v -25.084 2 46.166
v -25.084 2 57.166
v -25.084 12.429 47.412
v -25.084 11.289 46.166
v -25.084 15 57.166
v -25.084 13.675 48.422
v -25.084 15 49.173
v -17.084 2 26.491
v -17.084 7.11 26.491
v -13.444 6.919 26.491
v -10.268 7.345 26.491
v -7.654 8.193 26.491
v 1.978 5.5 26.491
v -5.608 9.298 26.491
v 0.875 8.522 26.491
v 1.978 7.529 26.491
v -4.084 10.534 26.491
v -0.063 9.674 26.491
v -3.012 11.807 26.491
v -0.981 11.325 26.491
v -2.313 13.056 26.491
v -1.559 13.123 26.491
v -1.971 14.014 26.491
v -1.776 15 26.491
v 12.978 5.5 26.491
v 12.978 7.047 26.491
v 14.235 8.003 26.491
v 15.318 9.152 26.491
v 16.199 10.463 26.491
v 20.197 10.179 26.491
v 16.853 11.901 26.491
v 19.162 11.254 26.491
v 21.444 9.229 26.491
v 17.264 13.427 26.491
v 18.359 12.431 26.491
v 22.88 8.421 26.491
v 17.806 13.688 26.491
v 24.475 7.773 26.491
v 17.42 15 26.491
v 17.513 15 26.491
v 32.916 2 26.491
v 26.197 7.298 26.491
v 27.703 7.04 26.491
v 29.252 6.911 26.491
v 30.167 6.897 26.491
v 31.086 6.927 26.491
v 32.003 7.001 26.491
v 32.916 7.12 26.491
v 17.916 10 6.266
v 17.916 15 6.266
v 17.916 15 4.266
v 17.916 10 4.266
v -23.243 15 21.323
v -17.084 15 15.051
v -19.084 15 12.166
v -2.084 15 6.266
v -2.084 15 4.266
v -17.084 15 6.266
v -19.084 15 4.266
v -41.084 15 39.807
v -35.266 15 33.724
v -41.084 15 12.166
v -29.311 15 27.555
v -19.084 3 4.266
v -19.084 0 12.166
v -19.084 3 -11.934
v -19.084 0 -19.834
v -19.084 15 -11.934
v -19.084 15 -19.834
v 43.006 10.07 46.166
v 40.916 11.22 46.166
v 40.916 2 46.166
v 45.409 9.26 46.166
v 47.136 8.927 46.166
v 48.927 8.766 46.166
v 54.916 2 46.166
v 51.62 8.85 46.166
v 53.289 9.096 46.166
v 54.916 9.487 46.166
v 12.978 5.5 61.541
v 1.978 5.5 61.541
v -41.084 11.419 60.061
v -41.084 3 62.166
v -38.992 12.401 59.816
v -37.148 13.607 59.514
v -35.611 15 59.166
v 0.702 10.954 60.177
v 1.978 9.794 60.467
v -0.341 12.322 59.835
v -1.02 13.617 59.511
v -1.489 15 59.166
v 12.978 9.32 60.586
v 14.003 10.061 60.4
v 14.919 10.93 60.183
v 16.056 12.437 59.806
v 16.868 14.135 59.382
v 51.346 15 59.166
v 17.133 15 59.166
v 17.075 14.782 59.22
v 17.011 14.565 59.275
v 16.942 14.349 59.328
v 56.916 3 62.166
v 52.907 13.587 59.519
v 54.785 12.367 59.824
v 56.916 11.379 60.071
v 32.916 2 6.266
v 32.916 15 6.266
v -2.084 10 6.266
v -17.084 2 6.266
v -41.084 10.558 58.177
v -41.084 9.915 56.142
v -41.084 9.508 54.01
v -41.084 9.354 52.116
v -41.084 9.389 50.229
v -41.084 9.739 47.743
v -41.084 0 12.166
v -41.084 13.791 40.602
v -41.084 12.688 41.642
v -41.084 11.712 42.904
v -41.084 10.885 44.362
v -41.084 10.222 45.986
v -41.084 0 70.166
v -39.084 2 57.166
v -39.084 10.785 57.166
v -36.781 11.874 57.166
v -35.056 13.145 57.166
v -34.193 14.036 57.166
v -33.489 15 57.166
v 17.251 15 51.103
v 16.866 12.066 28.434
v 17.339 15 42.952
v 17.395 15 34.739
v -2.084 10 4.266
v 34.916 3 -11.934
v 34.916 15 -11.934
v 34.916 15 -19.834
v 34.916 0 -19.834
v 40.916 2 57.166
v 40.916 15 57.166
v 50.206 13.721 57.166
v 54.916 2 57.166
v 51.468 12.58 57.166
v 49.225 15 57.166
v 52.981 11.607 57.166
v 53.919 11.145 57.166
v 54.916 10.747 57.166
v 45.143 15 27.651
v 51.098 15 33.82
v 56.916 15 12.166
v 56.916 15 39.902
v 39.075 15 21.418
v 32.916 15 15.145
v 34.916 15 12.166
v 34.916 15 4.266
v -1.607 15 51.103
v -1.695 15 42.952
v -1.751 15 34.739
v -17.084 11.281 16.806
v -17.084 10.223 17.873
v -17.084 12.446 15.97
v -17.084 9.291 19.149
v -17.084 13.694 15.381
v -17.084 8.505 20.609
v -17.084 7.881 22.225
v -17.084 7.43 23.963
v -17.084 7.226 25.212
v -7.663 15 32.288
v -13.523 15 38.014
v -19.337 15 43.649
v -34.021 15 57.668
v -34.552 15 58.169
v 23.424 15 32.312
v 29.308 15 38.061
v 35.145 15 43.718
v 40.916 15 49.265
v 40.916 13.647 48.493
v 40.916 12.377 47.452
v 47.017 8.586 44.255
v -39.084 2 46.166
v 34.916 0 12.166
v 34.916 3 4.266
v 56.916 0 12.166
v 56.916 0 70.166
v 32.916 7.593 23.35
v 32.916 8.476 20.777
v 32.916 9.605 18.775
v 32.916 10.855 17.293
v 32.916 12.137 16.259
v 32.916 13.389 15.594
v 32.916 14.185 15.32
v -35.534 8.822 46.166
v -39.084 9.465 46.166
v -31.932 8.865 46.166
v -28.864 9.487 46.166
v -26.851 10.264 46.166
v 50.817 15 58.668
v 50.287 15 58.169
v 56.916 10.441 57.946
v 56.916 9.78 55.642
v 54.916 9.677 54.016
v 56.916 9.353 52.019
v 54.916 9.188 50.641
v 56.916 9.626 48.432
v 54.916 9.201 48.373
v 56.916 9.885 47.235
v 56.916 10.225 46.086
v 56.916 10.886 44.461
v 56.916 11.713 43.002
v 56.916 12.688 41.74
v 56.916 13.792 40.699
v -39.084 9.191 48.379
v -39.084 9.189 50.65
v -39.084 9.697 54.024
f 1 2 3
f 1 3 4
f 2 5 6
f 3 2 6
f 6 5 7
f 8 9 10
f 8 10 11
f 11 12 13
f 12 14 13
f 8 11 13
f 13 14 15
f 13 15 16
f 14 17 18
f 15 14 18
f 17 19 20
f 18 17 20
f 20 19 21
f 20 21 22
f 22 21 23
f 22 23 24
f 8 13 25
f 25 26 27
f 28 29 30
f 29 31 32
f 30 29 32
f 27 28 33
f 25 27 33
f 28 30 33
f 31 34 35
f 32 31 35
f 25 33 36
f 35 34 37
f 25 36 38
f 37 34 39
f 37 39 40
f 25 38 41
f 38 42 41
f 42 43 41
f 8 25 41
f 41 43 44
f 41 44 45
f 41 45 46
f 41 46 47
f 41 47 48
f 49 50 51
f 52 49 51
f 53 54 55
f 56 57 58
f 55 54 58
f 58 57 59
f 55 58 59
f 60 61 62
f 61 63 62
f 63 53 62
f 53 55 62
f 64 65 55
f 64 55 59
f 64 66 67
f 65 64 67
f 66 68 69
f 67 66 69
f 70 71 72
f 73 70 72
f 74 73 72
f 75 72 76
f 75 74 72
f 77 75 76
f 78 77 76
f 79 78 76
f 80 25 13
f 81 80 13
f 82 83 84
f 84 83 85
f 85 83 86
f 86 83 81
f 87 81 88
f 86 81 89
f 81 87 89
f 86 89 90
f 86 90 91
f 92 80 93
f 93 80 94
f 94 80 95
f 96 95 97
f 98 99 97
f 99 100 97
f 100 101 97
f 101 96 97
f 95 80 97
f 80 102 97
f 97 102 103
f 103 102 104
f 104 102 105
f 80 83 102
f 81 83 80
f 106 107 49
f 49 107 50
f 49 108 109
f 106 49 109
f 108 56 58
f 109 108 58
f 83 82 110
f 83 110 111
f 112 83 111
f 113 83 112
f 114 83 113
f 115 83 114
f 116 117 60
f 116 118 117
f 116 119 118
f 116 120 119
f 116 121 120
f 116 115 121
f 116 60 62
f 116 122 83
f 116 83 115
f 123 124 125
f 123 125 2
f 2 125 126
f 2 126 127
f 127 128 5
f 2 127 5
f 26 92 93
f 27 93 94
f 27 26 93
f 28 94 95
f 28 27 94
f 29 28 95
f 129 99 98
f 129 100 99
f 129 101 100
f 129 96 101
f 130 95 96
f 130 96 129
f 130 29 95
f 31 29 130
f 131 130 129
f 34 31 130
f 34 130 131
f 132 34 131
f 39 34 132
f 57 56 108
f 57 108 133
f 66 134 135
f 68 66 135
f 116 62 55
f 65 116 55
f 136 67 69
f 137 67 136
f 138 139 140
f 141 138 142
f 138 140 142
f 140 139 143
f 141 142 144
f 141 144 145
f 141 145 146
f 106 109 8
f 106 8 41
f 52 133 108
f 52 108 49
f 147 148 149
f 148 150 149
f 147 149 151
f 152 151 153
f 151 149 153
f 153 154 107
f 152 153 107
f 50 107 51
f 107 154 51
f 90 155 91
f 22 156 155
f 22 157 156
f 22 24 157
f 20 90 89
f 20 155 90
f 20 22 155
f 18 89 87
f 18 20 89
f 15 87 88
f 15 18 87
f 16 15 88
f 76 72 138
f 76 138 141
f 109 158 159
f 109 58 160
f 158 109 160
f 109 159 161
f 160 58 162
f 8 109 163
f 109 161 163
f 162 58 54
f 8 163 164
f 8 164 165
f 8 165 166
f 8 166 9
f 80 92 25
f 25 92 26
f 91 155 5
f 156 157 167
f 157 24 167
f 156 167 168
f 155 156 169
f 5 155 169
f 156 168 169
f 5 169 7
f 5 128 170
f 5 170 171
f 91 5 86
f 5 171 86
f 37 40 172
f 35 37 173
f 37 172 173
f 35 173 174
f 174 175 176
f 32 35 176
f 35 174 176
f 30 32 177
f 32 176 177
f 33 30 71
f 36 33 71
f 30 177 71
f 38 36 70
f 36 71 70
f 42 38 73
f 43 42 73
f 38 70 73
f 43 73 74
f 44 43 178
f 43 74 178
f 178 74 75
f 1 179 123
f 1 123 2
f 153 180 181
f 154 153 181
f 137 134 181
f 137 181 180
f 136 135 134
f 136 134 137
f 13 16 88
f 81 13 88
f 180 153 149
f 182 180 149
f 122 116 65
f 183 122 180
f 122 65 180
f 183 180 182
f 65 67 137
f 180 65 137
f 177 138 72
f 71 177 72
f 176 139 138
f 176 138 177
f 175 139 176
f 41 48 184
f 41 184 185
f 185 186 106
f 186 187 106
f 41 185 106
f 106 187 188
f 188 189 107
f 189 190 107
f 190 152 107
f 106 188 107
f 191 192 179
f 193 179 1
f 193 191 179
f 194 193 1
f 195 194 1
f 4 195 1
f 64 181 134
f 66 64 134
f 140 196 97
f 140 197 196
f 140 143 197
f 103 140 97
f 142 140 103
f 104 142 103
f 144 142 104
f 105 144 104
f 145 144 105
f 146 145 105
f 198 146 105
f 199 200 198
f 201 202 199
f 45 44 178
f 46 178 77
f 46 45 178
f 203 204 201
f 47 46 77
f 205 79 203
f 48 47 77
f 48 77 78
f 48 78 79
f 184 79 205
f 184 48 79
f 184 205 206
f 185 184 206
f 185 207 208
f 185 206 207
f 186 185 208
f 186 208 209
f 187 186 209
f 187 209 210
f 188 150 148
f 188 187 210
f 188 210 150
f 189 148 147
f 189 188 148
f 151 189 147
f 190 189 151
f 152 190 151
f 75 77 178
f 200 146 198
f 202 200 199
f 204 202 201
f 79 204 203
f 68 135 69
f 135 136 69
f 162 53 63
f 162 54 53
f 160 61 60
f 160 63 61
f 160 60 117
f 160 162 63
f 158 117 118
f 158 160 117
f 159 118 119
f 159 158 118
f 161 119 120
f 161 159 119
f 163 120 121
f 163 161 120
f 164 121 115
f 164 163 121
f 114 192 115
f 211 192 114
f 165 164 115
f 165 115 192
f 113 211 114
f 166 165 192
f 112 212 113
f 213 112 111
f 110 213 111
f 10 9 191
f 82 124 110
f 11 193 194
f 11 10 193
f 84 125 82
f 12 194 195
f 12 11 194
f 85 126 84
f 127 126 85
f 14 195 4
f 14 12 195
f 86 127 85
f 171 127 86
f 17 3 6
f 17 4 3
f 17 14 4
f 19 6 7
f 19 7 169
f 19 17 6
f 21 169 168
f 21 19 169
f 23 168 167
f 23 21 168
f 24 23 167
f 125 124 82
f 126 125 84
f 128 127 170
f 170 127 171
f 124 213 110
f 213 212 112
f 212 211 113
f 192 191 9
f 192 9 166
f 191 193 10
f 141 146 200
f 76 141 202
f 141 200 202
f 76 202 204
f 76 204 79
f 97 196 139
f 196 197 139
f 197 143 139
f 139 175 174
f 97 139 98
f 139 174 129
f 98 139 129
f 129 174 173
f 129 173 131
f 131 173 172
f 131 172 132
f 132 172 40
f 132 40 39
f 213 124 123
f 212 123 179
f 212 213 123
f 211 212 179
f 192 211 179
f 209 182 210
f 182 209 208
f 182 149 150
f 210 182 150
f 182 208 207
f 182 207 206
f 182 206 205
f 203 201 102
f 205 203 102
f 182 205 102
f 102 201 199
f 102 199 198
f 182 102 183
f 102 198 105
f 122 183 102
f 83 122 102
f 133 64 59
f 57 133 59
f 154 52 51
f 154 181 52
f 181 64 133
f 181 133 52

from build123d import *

# Parameters (mm, degrees)
SKETCH1_W                = 98
SKETCH1_H                = 90
BOSS_EXTRUDE1_DEPTH      = 15
CUT_EXTRUDE1_DEPTH       = 15
CUT_EXTRUDE2_DEPTH       = 15
CUT_EXTRUDE5_DEPTH       = 100
CUT_EXTRUDE6_DEPTH       = 100
SKETCH9_R                = 9.5
CUT_EXTRUDE7_DEPTH       = 45
SKETCH10_R               = 9.5
CUT_EXTRUDE8_DEPTH       = 45
BOSS_EXTRUDE3_DEPTH      = 100
BOSS_EXTRUDE4_DEPTH      = 100
SKETCH14_W               = 54.537944566
SKETCH14_H               = 37.433727788
CUT_EXTRUDE9_DEPTH       = 100
SKETCH15_W               = 37.221464136
SKETCH15_H               = 31.979004399
CUT_EXTRUDE10_DEPTH      = 100
BOSS_EXTRUDE5_DEPTH      = 15
BOSS_EXTRUDE6_DEPTH      = 15
BOSS_EXTRUDE7_DEPTH      = 15
CUT_EXTRUDE11_DEPTH      = 100
SKETCH20_R               = 9.5
CUT_EXTRUDE12_DEPTH      = 45
SKETCH21_R               = 9.5
CUT_EXTRUDE13_DEPTH      = 100
SKETCH22_R               = 9.5
BOSS_EXTRUDE8_DEPTH      = 55
SKETCH23_R               = 9.5
CUT_EXTRUDE14_DEPTH      = 55
SKETCH24_R               = 9.5
CUT_EXTRUDE15_DEPTH      = 100
SKETCH25_R               = 9.5
BOSS_EXTRUDE10_DEPTH     = 100
SKETCH26_R               = 9.5
CUT_EXTRUDE16_DEPTH      = 100
CUT_EXTRUDE19_DEPTH      = 100
CUT_EXTRUDE19_DEPTH_BACK = 100
SKETCH27_W               = 176.377882562
SKETCH27_H               = 122.842530298
SKETCH27_W_2             = 98
SKETCH27_H_2             = 90
SKETCH28_W               = 109.510814303
SKETCH28_H               = 24.111992001
CUT_EXTRUDE20_DEPTH      = 100
SKETCH29_R               = 9.59940523
CUT_EXTRUDE21_DEPTH      = 100
SKETCH30_W               = 22
SKETCH30_H               = 32
CUT_EXTRUDE22_DEPTH      = 100
SKETCH31_W               = 16.2
SKETCH31_H               = 12
CUT_EXTRUDE23_DEPTH      = 100
CUT_EXTRUDE24_DEPTH      = 13
SKETCH33_W               = 50.373016546
SKETCH33_H               = 2
BOSS_EXTRUDE12_DEPTH     = 15
SKETCH34_W               = 20
SKETCH34_H               = 2
CUT_EXTRUDE25_DEPTH      = 5
CUT_EXTRUDE27_DEPTH      = 100
SKETCH37_W               = 14
SKETCH37_H               = 11
CUT_EXTRUDE28_DEPTH      = 13
CUT_EXTRUDE32_DEPTH      = 9.5


with BuildPart() as part:
    # Sketch1 → Boss-Extrude1 (new body)
    with BuildSketch(Plane(origin=(0, 0, 0), x_dir=(1, 0, 0), z_dir=(0, 1, 0))):
        with Locations((7.915679061, -25.165675541)):
            Rectangle(SKETCH1_W, SKETCH1_H)
    extrude(amount=BOSS_EXTRUDE1_DEPTH)

    # Sketch3 → Cut-Extrude1 (cut)
    with BuildSketch(Plane(origin=(0, 15, 0), x_dir=(1, 0, 0), z_dir=(0, 1, 0))):
        Polygon((-41.084320939, -35.165675541), (-6.084320939, -70.165675541), (-41.084320939, -70.165675541), align=None)
        Polygon((21.915679061, -70.165675541), (56.915679061, -35.165675541), (56.915679061, -70.165675541), align=None)
    extrude(amount=-CUT_EXTRUDE1_DEPTH, mode=Mode.SUBTRACT)

    # Sketch4 → Cut-Extrude2 (cut)
    with BuildSketch(Plane(origin=(0, 15, 0), x_dir=(1, 0, 0), z_dir=(0, 1, 0))):
        Polygon((-41.084320939, -35.165675541), (-32.241899351, -26.323253953), (-41.084320939, -17.480832365), align=None)
        Polygon((56.915679061, -17.480832365), (48.073257473, -26.323253953), (56.915679061, -35.165675541), align=None)
    extrude(amount=-CUT_EXTRUDE2_DEPTH, mode=Mode.SUBTRACT)

    # Sketch5 → Cut-Extrude5 (cut)
    with BuildSketch(Plane(origin=(-2.959322699, 0, -2.959322699), x_dir=(-0.7071067811865461, 0, 0.7071067811865489), z_dir=(-0.7071067811865489, 0, -0.7071067811865461))):
        Polygon((53.916889577, 0), (52.916889577, 15), (53.916889577, 15), align=None)
    extrude(amount=-CUT_EXTRUDE5_DEPTH, mode=Mode.SUBTRACT)

    # Sketch8 → Cut-Extrude6 (cut)
    with BuildSketch(Plane(origin=(10.87500176, 0, -10.87500176), x_dir=(-0.7071067811865438, 0, -0.7071067811865513), z_dir=(0.7071067811865513, 0, -0.7071067811865438))):
        Polygon((-65.11135026, 0), (-64.11135026, 15), (-65.11135026, 15), align=None)
    extrude(amount=-CUT_EXTRUDE6_DEPTH, mode=Mode.SUBTRACT)

    # Sketch9 → Cut-Extrude7 (cut)
    with BuildSketch(Plane(origin=(45.83695749, 4.321549796, 45.83695749), x_dir=(0.7086694500121591, -0.06622532692378834, -0.7024256663116043), z_dir=(0.7055406512876944, 0.06651901052377404, 0.7055406512877016))):
        with Locations((-0.364665022, 13.674807707)):
            Circle(SKETCH9_R)
    extrude(amount=-CUT_EXTRUDE7_DEPTH, mode=Mode.SUBTRACT)

    # Sketch10 → Cut-Extrude8 (cut)
    with BuildSketch(Plane(origin=(-37.956303558, 3.578554618, 37.956303558), x_dir=(0.708669450012157, 0.06622532692378813, 0.7024256663116066), z_dir=(-0.7055406512876966, 0.06651901052377338, 0.7055406512876994))):
        with Locations((11.452044949, 13.683576238)):
            Circle(SKETCH10_R)
    extrude(amount=-CUT_EXTRUDE8_DEPTH, mode=Mode.SUBTRACT)

    # Sketch12 → Boss-Extrude3 (add)
    with BuildSketch(Plane(origin=(10.87500176, 0, -10.87500176), x_dir=(-0.7071067811865438, 0, -0.7071067811865513), z_dir=(0.7071067811865513, 0, -0.7071067811865438))):
        Polygon((-65.11135026, 0), (-64.11135026, 15), (-65.11135026, 15), align=None)
    extrude(amount=-BOSS_EXTRUDE3_DEPTH)

    # Sketch13 → Boss-Extrude4 (add)
    with BuildSketch(Plane(origin=(-2.959322699, 0, -2.959322699), x_dir=(-0.7071067811865461, 0, 0.7071067811865489), z_dir=(-0.7071067811865489, 0, -0.7071067811865461))):
        Polygon((53.916889577, 0), (52.916889577, 15), (53.916889577, 15), align=None)
    extrude(amount=-BOSS_EXTRUDE4_DEPTH)

    # Sketch14 → Cut-Extrude9 (cut)
    with BuildSketch(Plane(origin=(0, 15, 0), x_dir=(1, 0, 0), z_dir=(0, 1, 0))):
        with Locations((21.184651344, -88.882539435)):
            Rectangle(SKETCH14_W, SKETCH14_H)
    extrude(amount=-CUT_EXTRUDE9_DEPTH, mode=Mode.SUBTRACT)


with BuildPart() as cut_extrude9_piece_1:
    # of the separate pieces the step leaves, piece 1, a body of its own (cut_extrude9_pieces)
    add(part.part.solids().sort_by_distance((-41.084320939, 0, -19.834324459))[0])

    # Sketch16 → Boss-Extrude5 (add)
    with BuildSketch(Plane(origin=(0, 15, 0), x_dir=(1, 0, 0), z_dir=(0, 1, 0))):
        Polygon((-6.084320939, -70.165675541), (-35.8985557, -70.165675541), (-41.084320939, -70.165675541), (-41.084320939, -35.165675541), align=None)
    extrude(amount=-BOSS_EXTRUDE5_DEPTH)

    # Sketch17 → Boss-Extrude6 (add)
    with BuildSketch(Plane(origin=(0, 15, 0), x_dir=(1, 0, 0), z_dir=(0, 1, 0))):
        Polygon((21.915679061, -70.165675541), (49.886241171, -70.165675541), (56.915679061, -70.165675541), (56.915679061, -35.165675541), align=None)
    extrude(amount=-BOSS_EXTRUDE6_DEPTH)

    # Sketch18 → Boss-Extrude7 (add)
    with BuildSketch(Plane(origin=(0, 15, 0), x_dir=(1, 0, 0), z_dir=(0, 1, 0))):
        Polygon((48.073257473, -26.323253953), (56.915679061, -17.480832365), (56.915679061, -35.165675541), align=None)
        Polygon((-41.084320939, -35.165675541), (-41.084320939, -17.480832365), (-32.241899351, -26.323253953), align=None)
    extrude(amount=-BOSS_EXTRUDE7_DEPTH)

    # Sketch19 → Cut-Extrude11 (cut)
    with BuildSketch(Plane(origin=(56.915679061, 0, 0), x_dir=(0, 0, -1), z_dir=(1, 0, 0))):
        Polygon((-70.165675541, 0), (-69.165675541, 15), (-70.165675541, 15), align=None)
    extrude(amount=-CUT_EXTRUDE11_DEPTH, mode=Mode.SUBTRACT)

    # Sketch20 → Cut-Extrude12 (cut)
    with BuildSketch(Plane(origin=(0, 4.657013863, 69.85520795), x_dir=(1, 0, 0), z_dir=(0, 0.06651901052377399, 0.997785157856609))):
        with Locations((7.915679061, 13.33264869)):
            Circle(SKETCH20_R)
    extrude(amount=-CUT_EXTRUDE12_DEPTH, mode=Mode.SUBTRACT)

    # Sketch21 → Cut-Extrude13 (cut)
    with BuildSketch(Plane(origin=(14.087628182, 1.328194322, 14.087628182), x_dir=(0.708669450012159, -0.06622532692378837, -0.7024256663116044), z_dir=(0.7055406512876945, 0.06651901052377404, 0.7055406512877015))):
        with Locations((2.201455665, 13.878873478)):
            Circle(SKETCH21_R)
    extrude(amount=CUT_EXTRUDE13_DEPTH, mode=Mode.SUBTRACT)

    # Sketch22 → Boss-Extrude8 (add)
    with BuildSketch(Plane(origin=(14.087628182, 1.328194322, 14.087628182), x_dir=(0.708669450012159, -0.06622532692378837, -0.7024256663116044), z_dir=(0.7055406512876945, 0.06651901052377404, 0.7055406512877015))):
        with Locations((-0.364665022, 13.674807707)):
            Circle(SKETCH22_R)
    extrude(amount=BOSS_EXTRUDE8_DEPTH)

    # Sketch23 → Cut-Extrude14 (cut)
    with BuildSketch(Plane(origin=(52.892364003, 4.986739901, 52.892364003), x_dir=(0.7024256663116113, 0.0662253269237897, -0.7086694500121521), z_dir=(0.7055406512876945, 0.06651901052377404, 0.7055406512877014))):
        with Locations((4.020343442, 13.465005557)):
            Circle(SKETCH23_R)
    extrude(amount=-CUT_EXTRUDE14_DEPTH, mode=Mode.SUBTRACT)

    # Sketch24 → Cut-Extrude15 (cut)
    with BuildSketch(Plane(origin=(-6.20697425, 0.585199144, 6.20697425), x_dir=(0.708669450012157, 0.06622532692378813, 0.7024256663116066), z_dir=(-0.7055406512876966, 0.06651901052377338, 0.7055406512876995))):
        with Locations((8.951834225, 13.883257743)):
            Circle(SKETCH24_R)
    extrude(amount=CUT_EXTRUDE15_DEPTH, mode=Mode.SUBTRACT)

    # Sketch25 → Boss-Extrude10 (add)
    with BuildSketch(Plane(origin=(-6.20697425, 0.585199144, 6.20697425), x_dir=(0.708669450012157, 0.06622532692378813, 0.7024256663116066), z_dir=(-0.7055406512876966, 0.06651901052377338, 0.7055406512876994))):
        with Locations((11.452044949, 13.683576238)):
            Circle(SKETCH25_R)
    extrude(amount=BOSS_EXTRUDE10_DEPTH)

    # Sketch26 → Cut-Extrude16 (cut)
    with BuildSketch(Plane(origin=(-6.20697425, 0.585199144, 6.20697425), x_dir=(0.708669450012157, 0.06622532692378813, 0.7024256663116066), z_dir=(-0.7055406512876966, 0.06651901052377338, 0.7055406512876994))):
        with Locations((8.951834225, 13.883257743)):
            Circle(SKETCH26_R)
    extrude(amount=CUT_EXTRUDE16_DEPTH, mode=Mode.SUBTRACT)

    # Sketch27 → Cut-Extrude19 (cut, two sides: drawn at the far end of the back side and taken through both)
    with BuildSketch(Plane(origin=(0, 15, 0), x_dir=(1, 0, 0), z_dir=(0, 1, 0)).offset(-CUT_EXTRUDE19_DEPTH_BACK)):
        with Locations((3.867081439, -38.319377922)):
            Rectangle(SKETCH27_W, SKETCH27_H)
        with Locations((7.915679061, -25.165675541)):
            Rectangle(SKETCH27_W_2, SKETCH27_H_2, mode=Mode.SUBTRACT)
    extrude(amount=CUT_EXTRUDE19_DEPTH + CUT_EXTRUDE19_DEPTH_BACK, mode=Mode.SUBTRACT)

    # Sketch28 → Cut-Extrude20 (cut)
    with BuildSketch(Plane(origin=(0, 0, -19.834324459), x_dir=(-1, 0, 0), z_dir=(0, 0, -1))):
        with Locations((-2.16027191, 27.055996001)):
            Rectangle(SKETCH28_W, SKETCH28_H)
    extrude(amount=-CUT_EXTRUDE20_DEPTH, mode=Mode.SUBTRACT)

    # Sketch29 → Cut-Extrude21 (cut)
    with BuildSketch(Plane(origin=(0, 1.66365839, 24.954875847), x_dir=(1, 0, 0), z_dir=(0, 0.066519010523774, 0.997785157856609))):
        with Locations((7.822016096, 13.365945069)):
            Circle(SKETCH29_R)
    extrude(amount=CUT_EXTRUDE21_DEPTH, mode=Mode.SUBTRACT)

    # Sketch30 → Cut-Extrude22 (cut)
    with BuildSketch(Plane(origin=(0, 15, 0), x_dir=(1, 0, 0), z_dir=(0, 1, 0))):
        with Locations((-30.084320939, 3.834324459)):
            Rectangle(SKETCH30_W, SKETCH30_H)
        with Locations((45.915679061, 3.834324459)):
            Rectangle(SKETCH30_W, SKETCH30_H)
    extrude(amount=-CUT_EXTRUDE22_DEPTH, mode=Mode.SUBTRACT)

    # Sketch31 → Cut-Extrude23 (cut)
    with BuildSketch(Plane(origin=(34.915679061, 0, 0), x_dir=(0, 0, -1), z_dir=(1, 0, 0))):
        with Locations((3.834324459, 9)):
            Rectangle(SKETCH31_W, SKETCH31_H)
    extrude(amount=-CUT_EXTRUDE23_DEPTH, mode=Mode.SUBTRACT)

    # Sketch32 → Cut-Extrude24 (cut)
    with BuildSketch(Plane(origin=(0, 15, 0), x_dir=(1, 0, 0), z_dir=(0, 1, 0))):
        Polygon((-1.776033561, -26.490930679), (32.915679061, -26.490930679), (32.915679061, -6.265675541), (-1.776033561, -6.265675541), (-17.084320939, -6.265675541), (-17.084320939, -26.490930679), align=None)
    extrude(amount=-CUT_EXTRUDE24_DEPTH, mode=Mode.SUBTRACT)

    # Sketch33 → Boss-Extrude12 (add)
    with BuildSketch(Plane(origin=(0, 15, 0), x_dir=(1, 0, 0), z_dir=(0, 1, 0))):
        with Locations((7.729170788, -5.265675541)):
            Rectangle(SKETCH33_W, SKETCH33_H)
    extrude(amount=-BOSS_EXTRUDE12_DEPTH)

    # Sketch34 → Cut-Extrude25 (cut)
    with BuildSketch(Plane(origin=(0, 15, 0), x_dir=(1, 0, 0), z_dir=(0, 1, 0))):
        with Locations((7.915679061, -5.265675541)):
            Rectangle(SKETCH34_W, SKETCH34_H)
    extrude(amount=-CUT_EXTRUDE25_DEPTH, mode=Mode.SUBTRACT)

    # Sketch35 → Cut-Extrude27 (cut)
    with BuildSketch(Plane(origin=(56.915679061, 0, 0), x_dir=(0, 0, -1), z_dir=(1, 0, 0))):
        Polygon((-70.165675541, 0), (-62.165675541, 3), (-59.165675541, 15), (-69.165675541, 15), align=None)
    extrude(amount=-CUT_EXTRUDE27_DEPTH, mode=Mode.SUBTRACT)

    # Sketch37 → Cut-Extrude28 (cut)
    with BuildSketch(Plane(origin=(0, 15, 0), x_dir=(1, 0, 0), z_dir=(0, 1, 0))):
        with Locations((-32.084320939, -51.665675541)):
            Rectangle(SKETCH37_W, SKETCH37_H)
        with Locations((47.915679061, -51.665675541)):
            Rectangle(SKETCH37_W, SKETCH37_H)
    extrude(amount=-CUT_EXTRUDE28_DEPTH, mode=Mode.SUBTRACT)

    # Sketch38 → Cut-Extrude32 (cut)
    with BuildSketch(Plane(origin=(0, 15, 0), x_dir=(1, 0, 0), z_dir=(0, 1, 0))):
        Polygon((1.978443982, -26.490930679), (12.978443982, -26.490930679), (12.978443982, -60.585728785), (12.978443982, -67.440751443), (1.978443982, -67.440751443), (1.978443982, -60.585728785), align=None)
    extrude(amount=-CUT_EXTRUDE32_DEPTH, mode=Mode.SUBTRACT)


with BuildPart() as cut_extrude9_piece_2:
    # of the separate pieces the step leaves, piece 2, a body of its own (cut_extrude9_pieces)
    add(part.part.solids().sort_by_distance((-6.084320939, 15, 96.751461979))[0])

    # Sketch15 → Cut-Extrude10 (cut)
    with BuildSketch(Plane(origin=(0, 15, 0), x_dir=(1, 0, 0), z_dir=(0, 1, 0))):
        with Locations((-15.067513526, -92.658393077)):
            Rectangle(SKETCH15_W, SKETCH15_H)
    extrude(amount=-CUT_EXTRUDE10_DEPTH, mode=Mode.SUBTRACT)


solid = cut_extrude9_piece_1.part
